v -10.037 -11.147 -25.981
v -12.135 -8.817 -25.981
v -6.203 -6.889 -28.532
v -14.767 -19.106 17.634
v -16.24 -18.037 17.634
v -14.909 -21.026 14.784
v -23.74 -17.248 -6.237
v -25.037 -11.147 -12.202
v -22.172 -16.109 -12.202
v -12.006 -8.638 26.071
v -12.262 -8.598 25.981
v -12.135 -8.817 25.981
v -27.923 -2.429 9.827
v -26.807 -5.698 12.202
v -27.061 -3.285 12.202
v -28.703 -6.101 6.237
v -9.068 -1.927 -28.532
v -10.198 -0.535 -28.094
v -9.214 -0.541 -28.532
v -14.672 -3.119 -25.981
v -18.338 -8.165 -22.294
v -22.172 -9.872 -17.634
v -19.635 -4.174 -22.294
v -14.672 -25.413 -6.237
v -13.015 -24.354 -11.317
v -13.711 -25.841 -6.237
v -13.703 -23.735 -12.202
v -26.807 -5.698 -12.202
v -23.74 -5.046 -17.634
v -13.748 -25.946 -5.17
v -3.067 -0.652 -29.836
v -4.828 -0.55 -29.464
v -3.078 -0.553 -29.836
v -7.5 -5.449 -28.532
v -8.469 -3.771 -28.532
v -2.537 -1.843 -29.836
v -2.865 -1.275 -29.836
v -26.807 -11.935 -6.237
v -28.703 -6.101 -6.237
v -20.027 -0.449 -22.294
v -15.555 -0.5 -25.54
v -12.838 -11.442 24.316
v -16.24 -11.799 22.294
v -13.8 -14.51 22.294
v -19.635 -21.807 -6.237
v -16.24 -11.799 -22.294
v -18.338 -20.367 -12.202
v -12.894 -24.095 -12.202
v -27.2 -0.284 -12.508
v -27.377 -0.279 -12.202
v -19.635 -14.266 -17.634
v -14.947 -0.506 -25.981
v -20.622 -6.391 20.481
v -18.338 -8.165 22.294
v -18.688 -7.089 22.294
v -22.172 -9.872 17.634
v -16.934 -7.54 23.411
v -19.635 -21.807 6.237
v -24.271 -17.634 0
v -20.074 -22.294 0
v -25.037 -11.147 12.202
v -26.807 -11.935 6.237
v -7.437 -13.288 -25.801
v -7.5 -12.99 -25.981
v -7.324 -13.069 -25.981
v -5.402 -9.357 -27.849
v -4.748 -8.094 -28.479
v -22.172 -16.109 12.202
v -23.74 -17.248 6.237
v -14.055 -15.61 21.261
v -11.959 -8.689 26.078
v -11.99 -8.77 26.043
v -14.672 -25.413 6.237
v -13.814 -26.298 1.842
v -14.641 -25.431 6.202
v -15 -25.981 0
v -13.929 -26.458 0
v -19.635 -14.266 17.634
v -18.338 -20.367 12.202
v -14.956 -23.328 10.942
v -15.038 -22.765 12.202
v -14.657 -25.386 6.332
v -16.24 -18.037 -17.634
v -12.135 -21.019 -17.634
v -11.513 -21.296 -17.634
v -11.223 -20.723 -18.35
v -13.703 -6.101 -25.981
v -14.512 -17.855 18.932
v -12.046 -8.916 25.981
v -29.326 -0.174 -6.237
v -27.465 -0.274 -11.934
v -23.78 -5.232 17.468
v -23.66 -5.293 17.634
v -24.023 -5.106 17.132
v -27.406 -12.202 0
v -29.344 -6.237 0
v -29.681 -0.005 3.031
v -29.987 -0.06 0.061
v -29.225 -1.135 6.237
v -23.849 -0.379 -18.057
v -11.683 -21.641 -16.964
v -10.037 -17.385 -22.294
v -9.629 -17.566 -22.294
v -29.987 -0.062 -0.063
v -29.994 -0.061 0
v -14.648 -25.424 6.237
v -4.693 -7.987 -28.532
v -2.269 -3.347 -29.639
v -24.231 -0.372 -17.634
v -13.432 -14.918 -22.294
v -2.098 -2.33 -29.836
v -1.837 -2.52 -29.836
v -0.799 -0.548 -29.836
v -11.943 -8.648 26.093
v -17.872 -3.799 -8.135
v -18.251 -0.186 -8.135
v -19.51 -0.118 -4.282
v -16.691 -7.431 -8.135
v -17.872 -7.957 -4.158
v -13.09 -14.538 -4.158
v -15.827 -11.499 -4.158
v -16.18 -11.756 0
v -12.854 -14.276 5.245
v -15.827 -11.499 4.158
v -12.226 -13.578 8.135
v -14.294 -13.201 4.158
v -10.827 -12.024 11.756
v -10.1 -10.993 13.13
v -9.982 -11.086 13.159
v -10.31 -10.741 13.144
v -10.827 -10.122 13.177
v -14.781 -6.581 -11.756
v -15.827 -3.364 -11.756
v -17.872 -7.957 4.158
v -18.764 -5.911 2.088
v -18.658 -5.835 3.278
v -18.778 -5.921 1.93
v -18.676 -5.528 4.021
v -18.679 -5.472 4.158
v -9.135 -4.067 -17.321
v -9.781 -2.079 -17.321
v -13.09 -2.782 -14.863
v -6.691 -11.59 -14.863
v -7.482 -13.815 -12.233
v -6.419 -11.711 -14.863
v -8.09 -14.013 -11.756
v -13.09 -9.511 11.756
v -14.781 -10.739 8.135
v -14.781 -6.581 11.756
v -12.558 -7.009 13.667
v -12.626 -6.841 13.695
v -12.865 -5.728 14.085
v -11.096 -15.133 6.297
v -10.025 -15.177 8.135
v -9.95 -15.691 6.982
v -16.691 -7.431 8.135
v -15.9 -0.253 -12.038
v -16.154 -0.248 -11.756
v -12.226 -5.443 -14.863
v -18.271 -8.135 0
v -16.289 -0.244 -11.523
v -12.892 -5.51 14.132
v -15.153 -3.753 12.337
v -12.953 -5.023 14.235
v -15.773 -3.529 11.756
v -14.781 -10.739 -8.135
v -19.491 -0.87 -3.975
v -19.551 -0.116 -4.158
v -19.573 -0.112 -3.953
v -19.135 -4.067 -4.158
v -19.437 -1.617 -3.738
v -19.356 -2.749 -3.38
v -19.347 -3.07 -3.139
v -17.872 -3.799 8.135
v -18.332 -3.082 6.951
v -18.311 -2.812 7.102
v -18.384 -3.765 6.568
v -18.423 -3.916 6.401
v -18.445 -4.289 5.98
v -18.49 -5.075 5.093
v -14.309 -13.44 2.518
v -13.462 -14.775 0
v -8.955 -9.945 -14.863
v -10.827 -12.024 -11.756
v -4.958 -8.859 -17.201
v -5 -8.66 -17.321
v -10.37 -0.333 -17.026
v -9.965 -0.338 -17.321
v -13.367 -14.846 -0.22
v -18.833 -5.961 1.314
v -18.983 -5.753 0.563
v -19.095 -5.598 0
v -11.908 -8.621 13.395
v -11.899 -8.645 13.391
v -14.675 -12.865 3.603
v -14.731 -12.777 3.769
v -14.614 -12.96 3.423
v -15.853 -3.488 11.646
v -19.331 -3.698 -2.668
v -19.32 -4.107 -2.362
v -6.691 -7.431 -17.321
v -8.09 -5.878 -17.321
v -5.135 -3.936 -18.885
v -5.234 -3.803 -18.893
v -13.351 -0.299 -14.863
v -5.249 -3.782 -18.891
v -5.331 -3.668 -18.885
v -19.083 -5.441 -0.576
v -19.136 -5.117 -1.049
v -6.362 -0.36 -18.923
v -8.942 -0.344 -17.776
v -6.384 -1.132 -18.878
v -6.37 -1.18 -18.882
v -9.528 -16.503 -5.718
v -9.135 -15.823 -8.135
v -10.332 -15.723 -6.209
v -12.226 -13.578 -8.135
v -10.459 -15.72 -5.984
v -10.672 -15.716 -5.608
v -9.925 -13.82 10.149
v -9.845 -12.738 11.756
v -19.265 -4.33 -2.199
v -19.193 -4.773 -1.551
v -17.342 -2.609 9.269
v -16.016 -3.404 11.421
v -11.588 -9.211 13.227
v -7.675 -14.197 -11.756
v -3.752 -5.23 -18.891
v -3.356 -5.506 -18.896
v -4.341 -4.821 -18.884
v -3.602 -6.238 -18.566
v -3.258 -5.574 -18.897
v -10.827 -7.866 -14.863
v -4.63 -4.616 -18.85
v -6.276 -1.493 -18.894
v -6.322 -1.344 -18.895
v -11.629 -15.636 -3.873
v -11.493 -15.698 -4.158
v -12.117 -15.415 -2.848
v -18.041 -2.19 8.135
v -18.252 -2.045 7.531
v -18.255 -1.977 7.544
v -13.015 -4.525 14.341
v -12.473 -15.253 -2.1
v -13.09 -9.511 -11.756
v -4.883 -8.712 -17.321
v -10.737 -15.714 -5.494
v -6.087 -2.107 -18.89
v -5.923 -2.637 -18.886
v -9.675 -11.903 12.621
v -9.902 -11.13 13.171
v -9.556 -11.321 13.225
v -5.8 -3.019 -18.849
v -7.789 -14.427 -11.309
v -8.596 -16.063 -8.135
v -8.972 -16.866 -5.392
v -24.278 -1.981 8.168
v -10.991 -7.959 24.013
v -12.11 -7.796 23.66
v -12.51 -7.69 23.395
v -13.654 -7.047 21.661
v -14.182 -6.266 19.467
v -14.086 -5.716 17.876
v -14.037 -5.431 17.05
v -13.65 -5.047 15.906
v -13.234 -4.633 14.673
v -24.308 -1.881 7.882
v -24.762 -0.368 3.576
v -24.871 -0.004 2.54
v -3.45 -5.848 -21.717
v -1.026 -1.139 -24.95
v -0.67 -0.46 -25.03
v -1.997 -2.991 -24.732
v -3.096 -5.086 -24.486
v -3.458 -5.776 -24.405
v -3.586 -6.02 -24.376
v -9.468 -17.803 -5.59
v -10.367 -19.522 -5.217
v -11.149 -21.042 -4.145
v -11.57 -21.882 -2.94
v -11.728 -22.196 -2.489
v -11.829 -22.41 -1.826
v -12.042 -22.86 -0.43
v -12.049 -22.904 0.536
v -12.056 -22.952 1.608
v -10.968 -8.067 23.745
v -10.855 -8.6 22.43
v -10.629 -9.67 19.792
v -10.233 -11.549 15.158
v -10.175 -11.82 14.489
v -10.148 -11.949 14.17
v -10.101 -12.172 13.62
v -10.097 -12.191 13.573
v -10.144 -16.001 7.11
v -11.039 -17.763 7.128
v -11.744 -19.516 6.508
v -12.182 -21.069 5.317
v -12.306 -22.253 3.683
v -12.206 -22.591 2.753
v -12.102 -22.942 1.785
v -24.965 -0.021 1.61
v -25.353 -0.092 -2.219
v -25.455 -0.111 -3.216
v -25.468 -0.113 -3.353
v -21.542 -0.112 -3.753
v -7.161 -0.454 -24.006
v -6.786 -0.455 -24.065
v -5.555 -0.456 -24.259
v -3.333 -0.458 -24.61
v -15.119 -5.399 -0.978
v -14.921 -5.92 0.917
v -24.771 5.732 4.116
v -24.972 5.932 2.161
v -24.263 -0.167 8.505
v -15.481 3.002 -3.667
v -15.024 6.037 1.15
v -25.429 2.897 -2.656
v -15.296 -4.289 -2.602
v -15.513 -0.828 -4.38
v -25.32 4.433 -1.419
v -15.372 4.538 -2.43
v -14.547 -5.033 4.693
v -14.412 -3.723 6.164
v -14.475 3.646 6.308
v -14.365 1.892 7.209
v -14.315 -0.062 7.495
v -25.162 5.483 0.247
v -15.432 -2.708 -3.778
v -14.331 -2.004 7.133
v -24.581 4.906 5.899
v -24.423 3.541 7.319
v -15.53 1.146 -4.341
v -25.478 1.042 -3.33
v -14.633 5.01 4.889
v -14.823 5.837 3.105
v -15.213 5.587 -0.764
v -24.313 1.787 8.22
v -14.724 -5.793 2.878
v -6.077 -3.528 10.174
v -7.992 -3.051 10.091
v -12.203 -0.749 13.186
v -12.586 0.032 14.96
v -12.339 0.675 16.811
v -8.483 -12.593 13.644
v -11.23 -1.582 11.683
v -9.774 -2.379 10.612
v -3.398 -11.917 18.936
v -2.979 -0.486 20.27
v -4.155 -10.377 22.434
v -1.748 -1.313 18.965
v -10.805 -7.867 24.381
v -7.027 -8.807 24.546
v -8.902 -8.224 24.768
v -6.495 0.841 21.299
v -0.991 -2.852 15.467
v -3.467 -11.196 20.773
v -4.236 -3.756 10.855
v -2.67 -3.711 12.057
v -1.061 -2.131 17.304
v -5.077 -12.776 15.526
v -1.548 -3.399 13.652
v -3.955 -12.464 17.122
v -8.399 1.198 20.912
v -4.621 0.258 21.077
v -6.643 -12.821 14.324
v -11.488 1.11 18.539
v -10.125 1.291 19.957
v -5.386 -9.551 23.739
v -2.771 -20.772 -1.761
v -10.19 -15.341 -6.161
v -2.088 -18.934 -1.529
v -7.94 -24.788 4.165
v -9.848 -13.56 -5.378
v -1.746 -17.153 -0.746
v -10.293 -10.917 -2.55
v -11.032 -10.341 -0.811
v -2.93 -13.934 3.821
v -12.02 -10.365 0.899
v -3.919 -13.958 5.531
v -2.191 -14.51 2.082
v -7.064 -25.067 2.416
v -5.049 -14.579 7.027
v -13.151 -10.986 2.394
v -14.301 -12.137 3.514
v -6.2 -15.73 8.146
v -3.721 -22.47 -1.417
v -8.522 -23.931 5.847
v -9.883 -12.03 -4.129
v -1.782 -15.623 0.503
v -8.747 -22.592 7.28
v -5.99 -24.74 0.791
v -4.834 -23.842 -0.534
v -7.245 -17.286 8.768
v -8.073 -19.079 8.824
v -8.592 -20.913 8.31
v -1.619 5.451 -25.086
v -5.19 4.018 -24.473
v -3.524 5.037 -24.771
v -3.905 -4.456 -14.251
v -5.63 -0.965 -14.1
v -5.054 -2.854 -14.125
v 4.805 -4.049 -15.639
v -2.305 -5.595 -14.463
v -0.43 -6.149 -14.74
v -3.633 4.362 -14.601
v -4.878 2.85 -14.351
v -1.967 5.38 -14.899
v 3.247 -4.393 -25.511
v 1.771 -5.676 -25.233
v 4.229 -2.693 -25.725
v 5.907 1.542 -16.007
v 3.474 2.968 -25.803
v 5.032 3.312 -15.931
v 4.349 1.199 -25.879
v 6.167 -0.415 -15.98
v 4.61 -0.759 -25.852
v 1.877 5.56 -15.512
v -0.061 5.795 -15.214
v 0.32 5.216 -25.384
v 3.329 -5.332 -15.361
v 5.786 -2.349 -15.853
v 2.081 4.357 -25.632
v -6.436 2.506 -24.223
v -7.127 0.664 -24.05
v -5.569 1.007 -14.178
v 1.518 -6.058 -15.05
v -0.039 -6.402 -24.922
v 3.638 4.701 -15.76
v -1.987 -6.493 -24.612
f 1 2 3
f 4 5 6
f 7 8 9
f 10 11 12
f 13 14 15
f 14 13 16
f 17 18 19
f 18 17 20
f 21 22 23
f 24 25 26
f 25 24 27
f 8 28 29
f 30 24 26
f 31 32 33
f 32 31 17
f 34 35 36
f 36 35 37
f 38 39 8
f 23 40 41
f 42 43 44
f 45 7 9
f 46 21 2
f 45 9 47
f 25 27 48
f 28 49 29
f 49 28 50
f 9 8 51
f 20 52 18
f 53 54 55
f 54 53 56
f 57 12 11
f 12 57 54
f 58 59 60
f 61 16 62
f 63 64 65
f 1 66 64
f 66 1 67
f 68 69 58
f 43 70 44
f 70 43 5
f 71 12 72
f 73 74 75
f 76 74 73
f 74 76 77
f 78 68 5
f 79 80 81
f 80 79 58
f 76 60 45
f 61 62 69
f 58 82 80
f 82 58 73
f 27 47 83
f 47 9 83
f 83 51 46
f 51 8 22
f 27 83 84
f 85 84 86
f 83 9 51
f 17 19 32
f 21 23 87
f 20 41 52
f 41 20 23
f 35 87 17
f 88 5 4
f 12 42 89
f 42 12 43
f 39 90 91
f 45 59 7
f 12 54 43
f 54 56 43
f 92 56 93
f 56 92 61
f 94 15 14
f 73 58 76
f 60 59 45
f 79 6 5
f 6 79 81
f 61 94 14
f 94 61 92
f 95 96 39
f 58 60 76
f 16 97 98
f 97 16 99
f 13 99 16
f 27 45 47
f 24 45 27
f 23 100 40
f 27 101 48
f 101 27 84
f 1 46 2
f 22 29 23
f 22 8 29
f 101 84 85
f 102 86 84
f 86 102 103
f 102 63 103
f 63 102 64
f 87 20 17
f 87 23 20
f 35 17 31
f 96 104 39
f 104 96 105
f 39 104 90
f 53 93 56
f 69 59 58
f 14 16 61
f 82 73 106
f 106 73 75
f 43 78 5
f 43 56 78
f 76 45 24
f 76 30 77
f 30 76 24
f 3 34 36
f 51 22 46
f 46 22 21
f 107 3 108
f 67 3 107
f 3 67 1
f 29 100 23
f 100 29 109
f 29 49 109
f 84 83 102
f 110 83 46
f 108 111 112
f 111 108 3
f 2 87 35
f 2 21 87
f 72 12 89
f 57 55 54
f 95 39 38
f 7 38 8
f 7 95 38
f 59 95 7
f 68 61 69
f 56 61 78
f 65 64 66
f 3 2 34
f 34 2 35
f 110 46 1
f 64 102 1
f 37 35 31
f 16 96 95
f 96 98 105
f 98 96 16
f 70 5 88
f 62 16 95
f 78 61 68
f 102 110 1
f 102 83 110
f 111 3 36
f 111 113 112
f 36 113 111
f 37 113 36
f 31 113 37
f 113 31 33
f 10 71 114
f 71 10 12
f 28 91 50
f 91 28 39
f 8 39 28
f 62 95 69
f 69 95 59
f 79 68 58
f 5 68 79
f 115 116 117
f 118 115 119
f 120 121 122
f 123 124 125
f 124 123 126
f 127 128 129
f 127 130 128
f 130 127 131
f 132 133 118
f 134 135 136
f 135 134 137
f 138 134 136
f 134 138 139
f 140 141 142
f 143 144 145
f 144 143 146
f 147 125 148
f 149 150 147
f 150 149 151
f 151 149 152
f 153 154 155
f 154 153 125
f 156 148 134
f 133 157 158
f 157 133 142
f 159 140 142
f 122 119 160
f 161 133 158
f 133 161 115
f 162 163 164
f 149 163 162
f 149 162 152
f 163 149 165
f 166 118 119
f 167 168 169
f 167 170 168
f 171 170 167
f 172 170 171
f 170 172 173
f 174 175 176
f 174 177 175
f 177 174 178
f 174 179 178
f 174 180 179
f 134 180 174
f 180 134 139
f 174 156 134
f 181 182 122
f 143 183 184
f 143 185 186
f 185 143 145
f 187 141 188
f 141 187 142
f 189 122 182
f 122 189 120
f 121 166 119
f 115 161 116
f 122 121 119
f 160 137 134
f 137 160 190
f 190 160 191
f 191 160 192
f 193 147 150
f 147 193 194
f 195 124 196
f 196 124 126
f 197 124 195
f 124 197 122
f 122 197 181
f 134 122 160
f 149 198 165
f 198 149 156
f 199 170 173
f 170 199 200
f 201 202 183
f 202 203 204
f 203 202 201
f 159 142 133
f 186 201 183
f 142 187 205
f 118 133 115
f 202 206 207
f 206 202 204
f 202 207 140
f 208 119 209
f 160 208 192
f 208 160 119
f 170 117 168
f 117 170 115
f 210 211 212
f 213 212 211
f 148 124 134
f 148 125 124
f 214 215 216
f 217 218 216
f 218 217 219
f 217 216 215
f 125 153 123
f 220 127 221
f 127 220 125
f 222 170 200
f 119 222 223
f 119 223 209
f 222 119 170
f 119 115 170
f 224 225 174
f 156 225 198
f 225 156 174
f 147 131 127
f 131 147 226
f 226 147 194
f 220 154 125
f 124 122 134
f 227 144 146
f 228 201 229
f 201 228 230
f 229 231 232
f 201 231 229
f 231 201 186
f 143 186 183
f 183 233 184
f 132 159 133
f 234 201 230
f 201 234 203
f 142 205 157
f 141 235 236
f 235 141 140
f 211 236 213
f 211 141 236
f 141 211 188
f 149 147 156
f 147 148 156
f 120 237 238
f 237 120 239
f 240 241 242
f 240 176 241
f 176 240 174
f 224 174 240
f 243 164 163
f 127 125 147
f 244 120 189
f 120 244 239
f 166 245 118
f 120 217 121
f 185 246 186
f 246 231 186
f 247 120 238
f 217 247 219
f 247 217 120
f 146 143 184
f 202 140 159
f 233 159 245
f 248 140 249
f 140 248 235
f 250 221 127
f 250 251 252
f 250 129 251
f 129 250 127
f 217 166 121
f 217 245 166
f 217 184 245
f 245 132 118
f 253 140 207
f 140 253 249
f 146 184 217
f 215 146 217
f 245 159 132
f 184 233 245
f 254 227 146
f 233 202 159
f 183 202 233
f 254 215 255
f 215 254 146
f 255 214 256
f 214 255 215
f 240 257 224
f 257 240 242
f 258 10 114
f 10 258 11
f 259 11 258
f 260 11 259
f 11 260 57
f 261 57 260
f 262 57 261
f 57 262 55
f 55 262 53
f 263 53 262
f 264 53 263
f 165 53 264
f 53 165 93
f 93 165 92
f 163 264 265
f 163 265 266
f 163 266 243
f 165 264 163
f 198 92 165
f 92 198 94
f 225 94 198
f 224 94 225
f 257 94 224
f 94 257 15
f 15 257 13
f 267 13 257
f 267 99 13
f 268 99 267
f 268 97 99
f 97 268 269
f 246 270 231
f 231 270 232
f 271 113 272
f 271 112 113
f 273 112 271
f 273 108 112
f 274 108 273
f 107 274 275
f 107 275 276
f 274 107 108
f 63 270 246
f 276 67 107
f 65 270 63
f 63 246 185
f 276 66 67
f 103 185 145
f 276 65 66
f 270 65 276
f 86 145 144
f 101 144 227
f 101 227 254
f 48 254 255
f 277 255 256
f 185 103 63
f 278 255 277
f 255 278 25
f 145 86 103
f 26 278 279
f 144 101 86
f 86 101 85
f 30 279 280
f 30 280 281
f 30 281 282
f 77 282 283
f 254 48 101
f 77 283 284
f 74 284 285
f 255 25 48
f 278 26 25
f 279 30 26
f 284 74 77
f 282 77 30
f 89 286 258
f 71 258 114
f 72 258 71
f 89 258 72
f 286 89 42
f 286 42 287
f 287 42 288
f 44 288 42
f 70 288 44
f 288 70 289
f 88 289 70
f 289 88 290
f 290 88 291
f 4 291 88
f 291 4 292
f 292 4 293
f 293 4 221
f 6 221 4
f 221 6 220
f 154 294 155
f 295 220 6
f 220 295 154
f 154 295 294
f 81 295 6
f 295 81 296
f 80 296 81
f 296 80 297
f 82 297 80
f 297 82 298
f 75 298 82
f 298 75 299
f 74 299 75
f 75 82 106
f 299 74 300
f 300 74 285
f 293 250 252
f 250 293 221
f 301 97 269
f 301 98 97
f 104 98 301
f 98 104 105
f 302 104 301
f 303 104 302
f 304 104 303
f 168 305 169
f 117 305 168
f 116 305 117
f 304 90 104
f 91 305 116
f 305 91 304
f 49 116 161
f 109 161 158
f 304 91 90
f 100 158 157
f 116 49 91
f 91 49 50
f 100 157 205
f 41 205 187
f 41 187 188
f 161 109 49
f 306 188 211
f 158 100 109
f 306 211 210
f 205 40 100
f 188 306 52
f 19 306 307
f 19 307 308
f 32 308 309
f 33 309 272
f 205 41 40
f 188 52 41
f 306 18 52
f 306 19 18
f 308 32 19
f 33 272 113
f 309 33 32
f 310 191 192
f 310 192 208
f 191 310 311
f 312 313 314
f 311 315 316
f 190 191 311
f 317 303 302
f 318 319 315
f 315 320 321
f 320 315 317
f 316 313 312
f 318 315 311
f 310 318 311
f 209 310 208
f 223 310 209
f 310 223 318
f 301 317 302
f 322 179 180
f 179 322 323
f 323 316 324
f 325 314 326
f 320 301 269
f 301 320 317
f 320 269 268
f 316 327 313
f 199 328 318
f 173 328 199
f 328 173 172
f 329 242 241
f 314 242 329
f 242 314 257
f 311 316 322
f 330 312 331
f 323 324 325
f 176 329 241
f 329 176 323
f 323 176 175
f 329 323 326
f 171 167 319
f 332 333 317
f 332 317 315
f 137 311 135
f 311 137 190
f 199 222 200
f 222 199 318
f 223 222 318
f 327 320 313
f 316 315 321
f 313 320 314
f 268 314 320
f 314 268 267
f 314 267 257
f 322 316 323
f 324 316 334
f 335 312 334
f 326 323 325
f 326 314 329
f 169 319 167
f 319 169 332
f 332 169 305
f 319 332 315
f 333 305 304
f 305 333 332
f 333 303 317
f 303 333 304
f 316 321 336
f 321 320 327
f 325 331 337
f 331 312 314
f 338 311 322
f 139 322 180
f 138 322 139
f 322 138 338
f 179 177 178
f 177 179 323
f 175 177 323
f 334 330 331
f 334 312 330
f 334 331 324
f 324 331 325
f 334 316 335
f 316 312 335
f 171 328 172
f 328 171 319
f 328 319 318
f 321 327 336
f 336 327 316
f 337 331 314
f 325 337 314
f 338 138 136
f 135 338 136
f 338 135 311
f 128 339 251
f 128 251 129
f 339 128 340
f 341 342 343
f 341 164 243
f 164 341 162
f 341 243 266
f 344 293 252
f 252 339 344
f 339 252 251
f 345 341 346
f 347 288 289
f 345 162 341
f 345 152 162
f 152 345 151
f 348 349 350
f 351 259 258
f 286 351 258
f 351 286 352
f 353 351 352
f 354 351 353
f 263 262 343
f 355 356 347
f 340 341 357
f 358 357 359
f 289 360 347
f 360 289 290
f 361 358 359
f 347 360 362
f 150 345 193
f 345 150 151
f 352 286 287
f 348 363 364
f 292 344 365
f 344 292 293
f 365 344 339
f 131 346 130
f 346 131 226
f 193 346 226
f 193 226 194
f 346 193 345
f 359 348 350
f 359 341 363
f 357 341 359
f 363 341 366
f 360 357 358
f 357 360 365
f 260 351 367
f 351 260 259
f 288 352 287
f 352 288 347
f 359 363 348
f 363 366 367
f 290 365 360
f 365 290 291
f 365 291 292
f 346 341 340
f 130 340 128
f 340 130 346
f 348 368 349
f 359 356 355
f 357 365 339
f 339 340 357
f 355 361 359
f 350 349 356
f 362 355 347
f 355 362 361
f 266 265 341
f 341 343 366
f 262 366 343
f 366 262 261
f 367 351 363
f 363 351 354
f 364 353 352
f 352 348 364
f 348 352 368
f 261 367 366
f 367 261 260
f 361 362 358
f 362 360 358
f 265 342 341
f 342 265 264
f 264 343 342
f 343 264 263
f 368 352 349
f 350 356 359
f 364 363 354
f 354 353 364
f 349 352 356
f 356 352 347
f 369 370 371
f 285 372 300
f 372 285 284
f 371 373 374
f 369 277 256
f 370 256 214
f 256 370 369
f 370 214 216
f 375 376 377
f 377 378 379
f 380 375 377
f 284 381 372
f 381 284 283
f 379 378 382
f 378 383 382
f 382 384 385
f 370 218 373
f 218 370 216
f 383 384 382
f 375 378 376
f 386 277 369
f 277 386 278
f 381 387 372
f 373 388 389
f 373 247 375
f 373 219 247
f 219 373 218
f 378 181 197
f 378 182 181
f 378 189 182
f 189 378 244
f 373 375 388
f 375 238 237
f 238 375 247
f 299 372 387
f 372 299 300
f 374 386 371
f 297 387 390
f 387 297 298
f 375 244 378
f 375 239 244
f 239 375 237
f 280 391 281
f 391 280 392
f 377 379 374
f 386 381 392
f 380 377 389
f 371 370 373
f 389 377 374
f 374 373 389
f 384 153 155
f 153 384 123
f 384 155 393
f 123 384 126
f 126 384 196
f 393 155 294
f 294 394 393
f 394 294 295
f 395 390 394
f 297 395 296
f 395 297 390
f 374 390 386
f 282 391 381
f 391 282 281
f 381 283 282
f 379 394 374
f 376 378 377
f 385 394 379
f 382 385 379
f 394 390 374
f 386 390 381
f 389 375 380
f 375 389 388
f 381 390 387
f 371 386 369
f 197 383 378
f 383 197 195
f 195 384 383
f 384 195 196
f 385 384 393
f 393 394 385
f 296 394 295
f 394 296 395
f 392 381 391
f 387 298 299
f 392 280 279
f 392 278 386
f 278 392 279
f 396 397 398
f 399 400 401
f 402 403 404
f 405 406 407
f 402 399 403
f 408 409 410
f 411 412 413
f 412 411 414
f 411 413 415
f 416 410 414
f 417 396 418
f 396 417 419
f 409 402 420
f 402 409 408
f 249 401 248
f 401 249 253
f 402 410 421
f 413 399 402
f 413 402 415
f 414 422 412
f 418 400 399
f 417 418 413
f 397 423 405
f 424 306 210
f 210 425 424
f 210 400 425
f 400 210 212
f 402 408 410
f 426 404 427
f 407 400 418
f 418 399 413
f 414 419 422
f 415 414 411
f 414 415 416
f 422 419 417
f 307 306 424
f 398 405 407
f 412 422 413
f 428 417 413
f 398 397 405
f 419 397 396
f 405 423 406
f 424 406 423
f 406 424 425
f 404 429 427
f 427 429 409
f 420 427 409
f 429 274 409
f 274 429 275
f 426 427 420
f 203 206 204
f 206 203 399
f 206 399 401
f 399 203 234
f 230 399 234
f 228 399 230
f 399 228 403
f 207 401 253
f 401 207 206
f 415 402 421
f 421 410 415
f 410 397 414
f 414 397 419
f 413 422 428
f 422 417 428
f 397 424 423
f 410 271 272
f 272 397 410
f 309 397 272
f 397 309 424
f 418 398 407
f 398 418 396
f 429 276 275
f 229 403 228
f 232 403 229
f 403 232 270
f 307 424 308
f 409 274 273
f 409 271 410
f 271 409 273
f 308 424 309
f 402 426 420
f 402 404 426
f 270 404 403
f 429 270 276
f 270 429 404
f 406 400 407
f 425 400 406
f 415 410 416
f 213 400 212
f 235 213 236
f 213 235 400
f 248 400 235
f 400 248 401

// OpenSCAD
// https://en.wikibooks.org/wiki/OpenSCAD_User_Manual/List_Comprehensions
function cat(L1, L2) = [for (i=[0:len(L1)+len(L2)-1]) 
                        i < len(L1)? L1[i] : L2[i-len(L1)]] ;

module construct_intersection_poly(vectors) {
    points = cat([[0, 0, 0]], vectors);
    
    // NB: The order of the faces must be clock-wise (looking from the outside towards the face)
    
    // the top face depends on the number of input vector (points)
    top = [[for(i=[1:len(vectors)]) i ]];
    // always triangles, first get the easy sides
    side_all_but_not_last = [for(i=[1:len(vectors) - 1]) [i + 1, i, 0]];
    // the last to connect to the first one
    side_last = [[0, 1, len(vectors)]];

    // concat all together
    faces = cat(cat(side_all_but_not_last, side_last), top);

    polyhedron( points, faces );
}

module construct_spheres(outer_radius, inner_radius) {
    difference() {
        mirror([0, 0, 1])
        sphere(r=outer_radius, center=true);

        union() {
            sphere(r=inner_radius, center=true);
//            translate([0, 0, -50])
//            cube([100, 100, 100], center=true);
        }
    }    
}

l1 = 20;
l2 = 10;
l3 = 10;

real_vectors = [[-0.9948266171932849, -0.00015485714145741815, 0.1015872912476312],
[-0.3984857593670732, -0.28854789426039135, 0.8706027867515364],
[-0.4641256842132446, -0.883604515803502, 0.06189029734333352],
[-0.026760578914151064, -0.01836892195863407, -0.9994730882431289]];

real_vectors2 = 100 * real_vectors;



intersection() {
    construct_intersection_poly(real_vectors2);
    construct_spheres(outer_radius=l1 + l2, inner_radius=l1);
}

//    construct_intersection_poly(real_vectors2);


function len_v(v) = sqrt(v[0] * v[0] + v[1] * v[1] + v[2] * v[2]);


function get_direction(v) = [acos(v[0] / len_v(v)), acos(v[1] / len_v(v)), acos(v[2] / len_v(v))];


function get_init_rotate(a) = a[0] > a[1] && a[0] > a[2] ? [0, 0, 0] : ( a[1] > a[0] && a[1] > a[2] ? [90, 0, 0] : ( a[2] > a[1] && a[2] > a[0] ? [9, 90, 0] : [0, 0, 0] ) );


module construct_plug(vector) {
//t_v_temp = [0, 0, 0];
t_v_temp = vector * l1;

translating_vector = [t_v_temp[0] , t_v_temp[1], t_v_temp[2]];

angles = get_direction(vector);

angles_turn = [angles[2], angles[0], angles[1]];
    
echo(angles);
    
rotate_vector = get_init_rotate(angles);
    
echo(angles[0] > angles[1]);
    


echo(rotate_vector);

translate(translating_vector)
rotate(angles_turn)
rotate(rotate_vector)
cylinder(h=l2, r=6, center=true);
}

construct_plug(real_vectors[0]);

construct_plug(real_vectors[1]);

construct_plug(real_vectors[2]);

construct_plug(real_vectors[3]);

//rotate([0, 90, 0])
//cylinder(h=12, r=6);
